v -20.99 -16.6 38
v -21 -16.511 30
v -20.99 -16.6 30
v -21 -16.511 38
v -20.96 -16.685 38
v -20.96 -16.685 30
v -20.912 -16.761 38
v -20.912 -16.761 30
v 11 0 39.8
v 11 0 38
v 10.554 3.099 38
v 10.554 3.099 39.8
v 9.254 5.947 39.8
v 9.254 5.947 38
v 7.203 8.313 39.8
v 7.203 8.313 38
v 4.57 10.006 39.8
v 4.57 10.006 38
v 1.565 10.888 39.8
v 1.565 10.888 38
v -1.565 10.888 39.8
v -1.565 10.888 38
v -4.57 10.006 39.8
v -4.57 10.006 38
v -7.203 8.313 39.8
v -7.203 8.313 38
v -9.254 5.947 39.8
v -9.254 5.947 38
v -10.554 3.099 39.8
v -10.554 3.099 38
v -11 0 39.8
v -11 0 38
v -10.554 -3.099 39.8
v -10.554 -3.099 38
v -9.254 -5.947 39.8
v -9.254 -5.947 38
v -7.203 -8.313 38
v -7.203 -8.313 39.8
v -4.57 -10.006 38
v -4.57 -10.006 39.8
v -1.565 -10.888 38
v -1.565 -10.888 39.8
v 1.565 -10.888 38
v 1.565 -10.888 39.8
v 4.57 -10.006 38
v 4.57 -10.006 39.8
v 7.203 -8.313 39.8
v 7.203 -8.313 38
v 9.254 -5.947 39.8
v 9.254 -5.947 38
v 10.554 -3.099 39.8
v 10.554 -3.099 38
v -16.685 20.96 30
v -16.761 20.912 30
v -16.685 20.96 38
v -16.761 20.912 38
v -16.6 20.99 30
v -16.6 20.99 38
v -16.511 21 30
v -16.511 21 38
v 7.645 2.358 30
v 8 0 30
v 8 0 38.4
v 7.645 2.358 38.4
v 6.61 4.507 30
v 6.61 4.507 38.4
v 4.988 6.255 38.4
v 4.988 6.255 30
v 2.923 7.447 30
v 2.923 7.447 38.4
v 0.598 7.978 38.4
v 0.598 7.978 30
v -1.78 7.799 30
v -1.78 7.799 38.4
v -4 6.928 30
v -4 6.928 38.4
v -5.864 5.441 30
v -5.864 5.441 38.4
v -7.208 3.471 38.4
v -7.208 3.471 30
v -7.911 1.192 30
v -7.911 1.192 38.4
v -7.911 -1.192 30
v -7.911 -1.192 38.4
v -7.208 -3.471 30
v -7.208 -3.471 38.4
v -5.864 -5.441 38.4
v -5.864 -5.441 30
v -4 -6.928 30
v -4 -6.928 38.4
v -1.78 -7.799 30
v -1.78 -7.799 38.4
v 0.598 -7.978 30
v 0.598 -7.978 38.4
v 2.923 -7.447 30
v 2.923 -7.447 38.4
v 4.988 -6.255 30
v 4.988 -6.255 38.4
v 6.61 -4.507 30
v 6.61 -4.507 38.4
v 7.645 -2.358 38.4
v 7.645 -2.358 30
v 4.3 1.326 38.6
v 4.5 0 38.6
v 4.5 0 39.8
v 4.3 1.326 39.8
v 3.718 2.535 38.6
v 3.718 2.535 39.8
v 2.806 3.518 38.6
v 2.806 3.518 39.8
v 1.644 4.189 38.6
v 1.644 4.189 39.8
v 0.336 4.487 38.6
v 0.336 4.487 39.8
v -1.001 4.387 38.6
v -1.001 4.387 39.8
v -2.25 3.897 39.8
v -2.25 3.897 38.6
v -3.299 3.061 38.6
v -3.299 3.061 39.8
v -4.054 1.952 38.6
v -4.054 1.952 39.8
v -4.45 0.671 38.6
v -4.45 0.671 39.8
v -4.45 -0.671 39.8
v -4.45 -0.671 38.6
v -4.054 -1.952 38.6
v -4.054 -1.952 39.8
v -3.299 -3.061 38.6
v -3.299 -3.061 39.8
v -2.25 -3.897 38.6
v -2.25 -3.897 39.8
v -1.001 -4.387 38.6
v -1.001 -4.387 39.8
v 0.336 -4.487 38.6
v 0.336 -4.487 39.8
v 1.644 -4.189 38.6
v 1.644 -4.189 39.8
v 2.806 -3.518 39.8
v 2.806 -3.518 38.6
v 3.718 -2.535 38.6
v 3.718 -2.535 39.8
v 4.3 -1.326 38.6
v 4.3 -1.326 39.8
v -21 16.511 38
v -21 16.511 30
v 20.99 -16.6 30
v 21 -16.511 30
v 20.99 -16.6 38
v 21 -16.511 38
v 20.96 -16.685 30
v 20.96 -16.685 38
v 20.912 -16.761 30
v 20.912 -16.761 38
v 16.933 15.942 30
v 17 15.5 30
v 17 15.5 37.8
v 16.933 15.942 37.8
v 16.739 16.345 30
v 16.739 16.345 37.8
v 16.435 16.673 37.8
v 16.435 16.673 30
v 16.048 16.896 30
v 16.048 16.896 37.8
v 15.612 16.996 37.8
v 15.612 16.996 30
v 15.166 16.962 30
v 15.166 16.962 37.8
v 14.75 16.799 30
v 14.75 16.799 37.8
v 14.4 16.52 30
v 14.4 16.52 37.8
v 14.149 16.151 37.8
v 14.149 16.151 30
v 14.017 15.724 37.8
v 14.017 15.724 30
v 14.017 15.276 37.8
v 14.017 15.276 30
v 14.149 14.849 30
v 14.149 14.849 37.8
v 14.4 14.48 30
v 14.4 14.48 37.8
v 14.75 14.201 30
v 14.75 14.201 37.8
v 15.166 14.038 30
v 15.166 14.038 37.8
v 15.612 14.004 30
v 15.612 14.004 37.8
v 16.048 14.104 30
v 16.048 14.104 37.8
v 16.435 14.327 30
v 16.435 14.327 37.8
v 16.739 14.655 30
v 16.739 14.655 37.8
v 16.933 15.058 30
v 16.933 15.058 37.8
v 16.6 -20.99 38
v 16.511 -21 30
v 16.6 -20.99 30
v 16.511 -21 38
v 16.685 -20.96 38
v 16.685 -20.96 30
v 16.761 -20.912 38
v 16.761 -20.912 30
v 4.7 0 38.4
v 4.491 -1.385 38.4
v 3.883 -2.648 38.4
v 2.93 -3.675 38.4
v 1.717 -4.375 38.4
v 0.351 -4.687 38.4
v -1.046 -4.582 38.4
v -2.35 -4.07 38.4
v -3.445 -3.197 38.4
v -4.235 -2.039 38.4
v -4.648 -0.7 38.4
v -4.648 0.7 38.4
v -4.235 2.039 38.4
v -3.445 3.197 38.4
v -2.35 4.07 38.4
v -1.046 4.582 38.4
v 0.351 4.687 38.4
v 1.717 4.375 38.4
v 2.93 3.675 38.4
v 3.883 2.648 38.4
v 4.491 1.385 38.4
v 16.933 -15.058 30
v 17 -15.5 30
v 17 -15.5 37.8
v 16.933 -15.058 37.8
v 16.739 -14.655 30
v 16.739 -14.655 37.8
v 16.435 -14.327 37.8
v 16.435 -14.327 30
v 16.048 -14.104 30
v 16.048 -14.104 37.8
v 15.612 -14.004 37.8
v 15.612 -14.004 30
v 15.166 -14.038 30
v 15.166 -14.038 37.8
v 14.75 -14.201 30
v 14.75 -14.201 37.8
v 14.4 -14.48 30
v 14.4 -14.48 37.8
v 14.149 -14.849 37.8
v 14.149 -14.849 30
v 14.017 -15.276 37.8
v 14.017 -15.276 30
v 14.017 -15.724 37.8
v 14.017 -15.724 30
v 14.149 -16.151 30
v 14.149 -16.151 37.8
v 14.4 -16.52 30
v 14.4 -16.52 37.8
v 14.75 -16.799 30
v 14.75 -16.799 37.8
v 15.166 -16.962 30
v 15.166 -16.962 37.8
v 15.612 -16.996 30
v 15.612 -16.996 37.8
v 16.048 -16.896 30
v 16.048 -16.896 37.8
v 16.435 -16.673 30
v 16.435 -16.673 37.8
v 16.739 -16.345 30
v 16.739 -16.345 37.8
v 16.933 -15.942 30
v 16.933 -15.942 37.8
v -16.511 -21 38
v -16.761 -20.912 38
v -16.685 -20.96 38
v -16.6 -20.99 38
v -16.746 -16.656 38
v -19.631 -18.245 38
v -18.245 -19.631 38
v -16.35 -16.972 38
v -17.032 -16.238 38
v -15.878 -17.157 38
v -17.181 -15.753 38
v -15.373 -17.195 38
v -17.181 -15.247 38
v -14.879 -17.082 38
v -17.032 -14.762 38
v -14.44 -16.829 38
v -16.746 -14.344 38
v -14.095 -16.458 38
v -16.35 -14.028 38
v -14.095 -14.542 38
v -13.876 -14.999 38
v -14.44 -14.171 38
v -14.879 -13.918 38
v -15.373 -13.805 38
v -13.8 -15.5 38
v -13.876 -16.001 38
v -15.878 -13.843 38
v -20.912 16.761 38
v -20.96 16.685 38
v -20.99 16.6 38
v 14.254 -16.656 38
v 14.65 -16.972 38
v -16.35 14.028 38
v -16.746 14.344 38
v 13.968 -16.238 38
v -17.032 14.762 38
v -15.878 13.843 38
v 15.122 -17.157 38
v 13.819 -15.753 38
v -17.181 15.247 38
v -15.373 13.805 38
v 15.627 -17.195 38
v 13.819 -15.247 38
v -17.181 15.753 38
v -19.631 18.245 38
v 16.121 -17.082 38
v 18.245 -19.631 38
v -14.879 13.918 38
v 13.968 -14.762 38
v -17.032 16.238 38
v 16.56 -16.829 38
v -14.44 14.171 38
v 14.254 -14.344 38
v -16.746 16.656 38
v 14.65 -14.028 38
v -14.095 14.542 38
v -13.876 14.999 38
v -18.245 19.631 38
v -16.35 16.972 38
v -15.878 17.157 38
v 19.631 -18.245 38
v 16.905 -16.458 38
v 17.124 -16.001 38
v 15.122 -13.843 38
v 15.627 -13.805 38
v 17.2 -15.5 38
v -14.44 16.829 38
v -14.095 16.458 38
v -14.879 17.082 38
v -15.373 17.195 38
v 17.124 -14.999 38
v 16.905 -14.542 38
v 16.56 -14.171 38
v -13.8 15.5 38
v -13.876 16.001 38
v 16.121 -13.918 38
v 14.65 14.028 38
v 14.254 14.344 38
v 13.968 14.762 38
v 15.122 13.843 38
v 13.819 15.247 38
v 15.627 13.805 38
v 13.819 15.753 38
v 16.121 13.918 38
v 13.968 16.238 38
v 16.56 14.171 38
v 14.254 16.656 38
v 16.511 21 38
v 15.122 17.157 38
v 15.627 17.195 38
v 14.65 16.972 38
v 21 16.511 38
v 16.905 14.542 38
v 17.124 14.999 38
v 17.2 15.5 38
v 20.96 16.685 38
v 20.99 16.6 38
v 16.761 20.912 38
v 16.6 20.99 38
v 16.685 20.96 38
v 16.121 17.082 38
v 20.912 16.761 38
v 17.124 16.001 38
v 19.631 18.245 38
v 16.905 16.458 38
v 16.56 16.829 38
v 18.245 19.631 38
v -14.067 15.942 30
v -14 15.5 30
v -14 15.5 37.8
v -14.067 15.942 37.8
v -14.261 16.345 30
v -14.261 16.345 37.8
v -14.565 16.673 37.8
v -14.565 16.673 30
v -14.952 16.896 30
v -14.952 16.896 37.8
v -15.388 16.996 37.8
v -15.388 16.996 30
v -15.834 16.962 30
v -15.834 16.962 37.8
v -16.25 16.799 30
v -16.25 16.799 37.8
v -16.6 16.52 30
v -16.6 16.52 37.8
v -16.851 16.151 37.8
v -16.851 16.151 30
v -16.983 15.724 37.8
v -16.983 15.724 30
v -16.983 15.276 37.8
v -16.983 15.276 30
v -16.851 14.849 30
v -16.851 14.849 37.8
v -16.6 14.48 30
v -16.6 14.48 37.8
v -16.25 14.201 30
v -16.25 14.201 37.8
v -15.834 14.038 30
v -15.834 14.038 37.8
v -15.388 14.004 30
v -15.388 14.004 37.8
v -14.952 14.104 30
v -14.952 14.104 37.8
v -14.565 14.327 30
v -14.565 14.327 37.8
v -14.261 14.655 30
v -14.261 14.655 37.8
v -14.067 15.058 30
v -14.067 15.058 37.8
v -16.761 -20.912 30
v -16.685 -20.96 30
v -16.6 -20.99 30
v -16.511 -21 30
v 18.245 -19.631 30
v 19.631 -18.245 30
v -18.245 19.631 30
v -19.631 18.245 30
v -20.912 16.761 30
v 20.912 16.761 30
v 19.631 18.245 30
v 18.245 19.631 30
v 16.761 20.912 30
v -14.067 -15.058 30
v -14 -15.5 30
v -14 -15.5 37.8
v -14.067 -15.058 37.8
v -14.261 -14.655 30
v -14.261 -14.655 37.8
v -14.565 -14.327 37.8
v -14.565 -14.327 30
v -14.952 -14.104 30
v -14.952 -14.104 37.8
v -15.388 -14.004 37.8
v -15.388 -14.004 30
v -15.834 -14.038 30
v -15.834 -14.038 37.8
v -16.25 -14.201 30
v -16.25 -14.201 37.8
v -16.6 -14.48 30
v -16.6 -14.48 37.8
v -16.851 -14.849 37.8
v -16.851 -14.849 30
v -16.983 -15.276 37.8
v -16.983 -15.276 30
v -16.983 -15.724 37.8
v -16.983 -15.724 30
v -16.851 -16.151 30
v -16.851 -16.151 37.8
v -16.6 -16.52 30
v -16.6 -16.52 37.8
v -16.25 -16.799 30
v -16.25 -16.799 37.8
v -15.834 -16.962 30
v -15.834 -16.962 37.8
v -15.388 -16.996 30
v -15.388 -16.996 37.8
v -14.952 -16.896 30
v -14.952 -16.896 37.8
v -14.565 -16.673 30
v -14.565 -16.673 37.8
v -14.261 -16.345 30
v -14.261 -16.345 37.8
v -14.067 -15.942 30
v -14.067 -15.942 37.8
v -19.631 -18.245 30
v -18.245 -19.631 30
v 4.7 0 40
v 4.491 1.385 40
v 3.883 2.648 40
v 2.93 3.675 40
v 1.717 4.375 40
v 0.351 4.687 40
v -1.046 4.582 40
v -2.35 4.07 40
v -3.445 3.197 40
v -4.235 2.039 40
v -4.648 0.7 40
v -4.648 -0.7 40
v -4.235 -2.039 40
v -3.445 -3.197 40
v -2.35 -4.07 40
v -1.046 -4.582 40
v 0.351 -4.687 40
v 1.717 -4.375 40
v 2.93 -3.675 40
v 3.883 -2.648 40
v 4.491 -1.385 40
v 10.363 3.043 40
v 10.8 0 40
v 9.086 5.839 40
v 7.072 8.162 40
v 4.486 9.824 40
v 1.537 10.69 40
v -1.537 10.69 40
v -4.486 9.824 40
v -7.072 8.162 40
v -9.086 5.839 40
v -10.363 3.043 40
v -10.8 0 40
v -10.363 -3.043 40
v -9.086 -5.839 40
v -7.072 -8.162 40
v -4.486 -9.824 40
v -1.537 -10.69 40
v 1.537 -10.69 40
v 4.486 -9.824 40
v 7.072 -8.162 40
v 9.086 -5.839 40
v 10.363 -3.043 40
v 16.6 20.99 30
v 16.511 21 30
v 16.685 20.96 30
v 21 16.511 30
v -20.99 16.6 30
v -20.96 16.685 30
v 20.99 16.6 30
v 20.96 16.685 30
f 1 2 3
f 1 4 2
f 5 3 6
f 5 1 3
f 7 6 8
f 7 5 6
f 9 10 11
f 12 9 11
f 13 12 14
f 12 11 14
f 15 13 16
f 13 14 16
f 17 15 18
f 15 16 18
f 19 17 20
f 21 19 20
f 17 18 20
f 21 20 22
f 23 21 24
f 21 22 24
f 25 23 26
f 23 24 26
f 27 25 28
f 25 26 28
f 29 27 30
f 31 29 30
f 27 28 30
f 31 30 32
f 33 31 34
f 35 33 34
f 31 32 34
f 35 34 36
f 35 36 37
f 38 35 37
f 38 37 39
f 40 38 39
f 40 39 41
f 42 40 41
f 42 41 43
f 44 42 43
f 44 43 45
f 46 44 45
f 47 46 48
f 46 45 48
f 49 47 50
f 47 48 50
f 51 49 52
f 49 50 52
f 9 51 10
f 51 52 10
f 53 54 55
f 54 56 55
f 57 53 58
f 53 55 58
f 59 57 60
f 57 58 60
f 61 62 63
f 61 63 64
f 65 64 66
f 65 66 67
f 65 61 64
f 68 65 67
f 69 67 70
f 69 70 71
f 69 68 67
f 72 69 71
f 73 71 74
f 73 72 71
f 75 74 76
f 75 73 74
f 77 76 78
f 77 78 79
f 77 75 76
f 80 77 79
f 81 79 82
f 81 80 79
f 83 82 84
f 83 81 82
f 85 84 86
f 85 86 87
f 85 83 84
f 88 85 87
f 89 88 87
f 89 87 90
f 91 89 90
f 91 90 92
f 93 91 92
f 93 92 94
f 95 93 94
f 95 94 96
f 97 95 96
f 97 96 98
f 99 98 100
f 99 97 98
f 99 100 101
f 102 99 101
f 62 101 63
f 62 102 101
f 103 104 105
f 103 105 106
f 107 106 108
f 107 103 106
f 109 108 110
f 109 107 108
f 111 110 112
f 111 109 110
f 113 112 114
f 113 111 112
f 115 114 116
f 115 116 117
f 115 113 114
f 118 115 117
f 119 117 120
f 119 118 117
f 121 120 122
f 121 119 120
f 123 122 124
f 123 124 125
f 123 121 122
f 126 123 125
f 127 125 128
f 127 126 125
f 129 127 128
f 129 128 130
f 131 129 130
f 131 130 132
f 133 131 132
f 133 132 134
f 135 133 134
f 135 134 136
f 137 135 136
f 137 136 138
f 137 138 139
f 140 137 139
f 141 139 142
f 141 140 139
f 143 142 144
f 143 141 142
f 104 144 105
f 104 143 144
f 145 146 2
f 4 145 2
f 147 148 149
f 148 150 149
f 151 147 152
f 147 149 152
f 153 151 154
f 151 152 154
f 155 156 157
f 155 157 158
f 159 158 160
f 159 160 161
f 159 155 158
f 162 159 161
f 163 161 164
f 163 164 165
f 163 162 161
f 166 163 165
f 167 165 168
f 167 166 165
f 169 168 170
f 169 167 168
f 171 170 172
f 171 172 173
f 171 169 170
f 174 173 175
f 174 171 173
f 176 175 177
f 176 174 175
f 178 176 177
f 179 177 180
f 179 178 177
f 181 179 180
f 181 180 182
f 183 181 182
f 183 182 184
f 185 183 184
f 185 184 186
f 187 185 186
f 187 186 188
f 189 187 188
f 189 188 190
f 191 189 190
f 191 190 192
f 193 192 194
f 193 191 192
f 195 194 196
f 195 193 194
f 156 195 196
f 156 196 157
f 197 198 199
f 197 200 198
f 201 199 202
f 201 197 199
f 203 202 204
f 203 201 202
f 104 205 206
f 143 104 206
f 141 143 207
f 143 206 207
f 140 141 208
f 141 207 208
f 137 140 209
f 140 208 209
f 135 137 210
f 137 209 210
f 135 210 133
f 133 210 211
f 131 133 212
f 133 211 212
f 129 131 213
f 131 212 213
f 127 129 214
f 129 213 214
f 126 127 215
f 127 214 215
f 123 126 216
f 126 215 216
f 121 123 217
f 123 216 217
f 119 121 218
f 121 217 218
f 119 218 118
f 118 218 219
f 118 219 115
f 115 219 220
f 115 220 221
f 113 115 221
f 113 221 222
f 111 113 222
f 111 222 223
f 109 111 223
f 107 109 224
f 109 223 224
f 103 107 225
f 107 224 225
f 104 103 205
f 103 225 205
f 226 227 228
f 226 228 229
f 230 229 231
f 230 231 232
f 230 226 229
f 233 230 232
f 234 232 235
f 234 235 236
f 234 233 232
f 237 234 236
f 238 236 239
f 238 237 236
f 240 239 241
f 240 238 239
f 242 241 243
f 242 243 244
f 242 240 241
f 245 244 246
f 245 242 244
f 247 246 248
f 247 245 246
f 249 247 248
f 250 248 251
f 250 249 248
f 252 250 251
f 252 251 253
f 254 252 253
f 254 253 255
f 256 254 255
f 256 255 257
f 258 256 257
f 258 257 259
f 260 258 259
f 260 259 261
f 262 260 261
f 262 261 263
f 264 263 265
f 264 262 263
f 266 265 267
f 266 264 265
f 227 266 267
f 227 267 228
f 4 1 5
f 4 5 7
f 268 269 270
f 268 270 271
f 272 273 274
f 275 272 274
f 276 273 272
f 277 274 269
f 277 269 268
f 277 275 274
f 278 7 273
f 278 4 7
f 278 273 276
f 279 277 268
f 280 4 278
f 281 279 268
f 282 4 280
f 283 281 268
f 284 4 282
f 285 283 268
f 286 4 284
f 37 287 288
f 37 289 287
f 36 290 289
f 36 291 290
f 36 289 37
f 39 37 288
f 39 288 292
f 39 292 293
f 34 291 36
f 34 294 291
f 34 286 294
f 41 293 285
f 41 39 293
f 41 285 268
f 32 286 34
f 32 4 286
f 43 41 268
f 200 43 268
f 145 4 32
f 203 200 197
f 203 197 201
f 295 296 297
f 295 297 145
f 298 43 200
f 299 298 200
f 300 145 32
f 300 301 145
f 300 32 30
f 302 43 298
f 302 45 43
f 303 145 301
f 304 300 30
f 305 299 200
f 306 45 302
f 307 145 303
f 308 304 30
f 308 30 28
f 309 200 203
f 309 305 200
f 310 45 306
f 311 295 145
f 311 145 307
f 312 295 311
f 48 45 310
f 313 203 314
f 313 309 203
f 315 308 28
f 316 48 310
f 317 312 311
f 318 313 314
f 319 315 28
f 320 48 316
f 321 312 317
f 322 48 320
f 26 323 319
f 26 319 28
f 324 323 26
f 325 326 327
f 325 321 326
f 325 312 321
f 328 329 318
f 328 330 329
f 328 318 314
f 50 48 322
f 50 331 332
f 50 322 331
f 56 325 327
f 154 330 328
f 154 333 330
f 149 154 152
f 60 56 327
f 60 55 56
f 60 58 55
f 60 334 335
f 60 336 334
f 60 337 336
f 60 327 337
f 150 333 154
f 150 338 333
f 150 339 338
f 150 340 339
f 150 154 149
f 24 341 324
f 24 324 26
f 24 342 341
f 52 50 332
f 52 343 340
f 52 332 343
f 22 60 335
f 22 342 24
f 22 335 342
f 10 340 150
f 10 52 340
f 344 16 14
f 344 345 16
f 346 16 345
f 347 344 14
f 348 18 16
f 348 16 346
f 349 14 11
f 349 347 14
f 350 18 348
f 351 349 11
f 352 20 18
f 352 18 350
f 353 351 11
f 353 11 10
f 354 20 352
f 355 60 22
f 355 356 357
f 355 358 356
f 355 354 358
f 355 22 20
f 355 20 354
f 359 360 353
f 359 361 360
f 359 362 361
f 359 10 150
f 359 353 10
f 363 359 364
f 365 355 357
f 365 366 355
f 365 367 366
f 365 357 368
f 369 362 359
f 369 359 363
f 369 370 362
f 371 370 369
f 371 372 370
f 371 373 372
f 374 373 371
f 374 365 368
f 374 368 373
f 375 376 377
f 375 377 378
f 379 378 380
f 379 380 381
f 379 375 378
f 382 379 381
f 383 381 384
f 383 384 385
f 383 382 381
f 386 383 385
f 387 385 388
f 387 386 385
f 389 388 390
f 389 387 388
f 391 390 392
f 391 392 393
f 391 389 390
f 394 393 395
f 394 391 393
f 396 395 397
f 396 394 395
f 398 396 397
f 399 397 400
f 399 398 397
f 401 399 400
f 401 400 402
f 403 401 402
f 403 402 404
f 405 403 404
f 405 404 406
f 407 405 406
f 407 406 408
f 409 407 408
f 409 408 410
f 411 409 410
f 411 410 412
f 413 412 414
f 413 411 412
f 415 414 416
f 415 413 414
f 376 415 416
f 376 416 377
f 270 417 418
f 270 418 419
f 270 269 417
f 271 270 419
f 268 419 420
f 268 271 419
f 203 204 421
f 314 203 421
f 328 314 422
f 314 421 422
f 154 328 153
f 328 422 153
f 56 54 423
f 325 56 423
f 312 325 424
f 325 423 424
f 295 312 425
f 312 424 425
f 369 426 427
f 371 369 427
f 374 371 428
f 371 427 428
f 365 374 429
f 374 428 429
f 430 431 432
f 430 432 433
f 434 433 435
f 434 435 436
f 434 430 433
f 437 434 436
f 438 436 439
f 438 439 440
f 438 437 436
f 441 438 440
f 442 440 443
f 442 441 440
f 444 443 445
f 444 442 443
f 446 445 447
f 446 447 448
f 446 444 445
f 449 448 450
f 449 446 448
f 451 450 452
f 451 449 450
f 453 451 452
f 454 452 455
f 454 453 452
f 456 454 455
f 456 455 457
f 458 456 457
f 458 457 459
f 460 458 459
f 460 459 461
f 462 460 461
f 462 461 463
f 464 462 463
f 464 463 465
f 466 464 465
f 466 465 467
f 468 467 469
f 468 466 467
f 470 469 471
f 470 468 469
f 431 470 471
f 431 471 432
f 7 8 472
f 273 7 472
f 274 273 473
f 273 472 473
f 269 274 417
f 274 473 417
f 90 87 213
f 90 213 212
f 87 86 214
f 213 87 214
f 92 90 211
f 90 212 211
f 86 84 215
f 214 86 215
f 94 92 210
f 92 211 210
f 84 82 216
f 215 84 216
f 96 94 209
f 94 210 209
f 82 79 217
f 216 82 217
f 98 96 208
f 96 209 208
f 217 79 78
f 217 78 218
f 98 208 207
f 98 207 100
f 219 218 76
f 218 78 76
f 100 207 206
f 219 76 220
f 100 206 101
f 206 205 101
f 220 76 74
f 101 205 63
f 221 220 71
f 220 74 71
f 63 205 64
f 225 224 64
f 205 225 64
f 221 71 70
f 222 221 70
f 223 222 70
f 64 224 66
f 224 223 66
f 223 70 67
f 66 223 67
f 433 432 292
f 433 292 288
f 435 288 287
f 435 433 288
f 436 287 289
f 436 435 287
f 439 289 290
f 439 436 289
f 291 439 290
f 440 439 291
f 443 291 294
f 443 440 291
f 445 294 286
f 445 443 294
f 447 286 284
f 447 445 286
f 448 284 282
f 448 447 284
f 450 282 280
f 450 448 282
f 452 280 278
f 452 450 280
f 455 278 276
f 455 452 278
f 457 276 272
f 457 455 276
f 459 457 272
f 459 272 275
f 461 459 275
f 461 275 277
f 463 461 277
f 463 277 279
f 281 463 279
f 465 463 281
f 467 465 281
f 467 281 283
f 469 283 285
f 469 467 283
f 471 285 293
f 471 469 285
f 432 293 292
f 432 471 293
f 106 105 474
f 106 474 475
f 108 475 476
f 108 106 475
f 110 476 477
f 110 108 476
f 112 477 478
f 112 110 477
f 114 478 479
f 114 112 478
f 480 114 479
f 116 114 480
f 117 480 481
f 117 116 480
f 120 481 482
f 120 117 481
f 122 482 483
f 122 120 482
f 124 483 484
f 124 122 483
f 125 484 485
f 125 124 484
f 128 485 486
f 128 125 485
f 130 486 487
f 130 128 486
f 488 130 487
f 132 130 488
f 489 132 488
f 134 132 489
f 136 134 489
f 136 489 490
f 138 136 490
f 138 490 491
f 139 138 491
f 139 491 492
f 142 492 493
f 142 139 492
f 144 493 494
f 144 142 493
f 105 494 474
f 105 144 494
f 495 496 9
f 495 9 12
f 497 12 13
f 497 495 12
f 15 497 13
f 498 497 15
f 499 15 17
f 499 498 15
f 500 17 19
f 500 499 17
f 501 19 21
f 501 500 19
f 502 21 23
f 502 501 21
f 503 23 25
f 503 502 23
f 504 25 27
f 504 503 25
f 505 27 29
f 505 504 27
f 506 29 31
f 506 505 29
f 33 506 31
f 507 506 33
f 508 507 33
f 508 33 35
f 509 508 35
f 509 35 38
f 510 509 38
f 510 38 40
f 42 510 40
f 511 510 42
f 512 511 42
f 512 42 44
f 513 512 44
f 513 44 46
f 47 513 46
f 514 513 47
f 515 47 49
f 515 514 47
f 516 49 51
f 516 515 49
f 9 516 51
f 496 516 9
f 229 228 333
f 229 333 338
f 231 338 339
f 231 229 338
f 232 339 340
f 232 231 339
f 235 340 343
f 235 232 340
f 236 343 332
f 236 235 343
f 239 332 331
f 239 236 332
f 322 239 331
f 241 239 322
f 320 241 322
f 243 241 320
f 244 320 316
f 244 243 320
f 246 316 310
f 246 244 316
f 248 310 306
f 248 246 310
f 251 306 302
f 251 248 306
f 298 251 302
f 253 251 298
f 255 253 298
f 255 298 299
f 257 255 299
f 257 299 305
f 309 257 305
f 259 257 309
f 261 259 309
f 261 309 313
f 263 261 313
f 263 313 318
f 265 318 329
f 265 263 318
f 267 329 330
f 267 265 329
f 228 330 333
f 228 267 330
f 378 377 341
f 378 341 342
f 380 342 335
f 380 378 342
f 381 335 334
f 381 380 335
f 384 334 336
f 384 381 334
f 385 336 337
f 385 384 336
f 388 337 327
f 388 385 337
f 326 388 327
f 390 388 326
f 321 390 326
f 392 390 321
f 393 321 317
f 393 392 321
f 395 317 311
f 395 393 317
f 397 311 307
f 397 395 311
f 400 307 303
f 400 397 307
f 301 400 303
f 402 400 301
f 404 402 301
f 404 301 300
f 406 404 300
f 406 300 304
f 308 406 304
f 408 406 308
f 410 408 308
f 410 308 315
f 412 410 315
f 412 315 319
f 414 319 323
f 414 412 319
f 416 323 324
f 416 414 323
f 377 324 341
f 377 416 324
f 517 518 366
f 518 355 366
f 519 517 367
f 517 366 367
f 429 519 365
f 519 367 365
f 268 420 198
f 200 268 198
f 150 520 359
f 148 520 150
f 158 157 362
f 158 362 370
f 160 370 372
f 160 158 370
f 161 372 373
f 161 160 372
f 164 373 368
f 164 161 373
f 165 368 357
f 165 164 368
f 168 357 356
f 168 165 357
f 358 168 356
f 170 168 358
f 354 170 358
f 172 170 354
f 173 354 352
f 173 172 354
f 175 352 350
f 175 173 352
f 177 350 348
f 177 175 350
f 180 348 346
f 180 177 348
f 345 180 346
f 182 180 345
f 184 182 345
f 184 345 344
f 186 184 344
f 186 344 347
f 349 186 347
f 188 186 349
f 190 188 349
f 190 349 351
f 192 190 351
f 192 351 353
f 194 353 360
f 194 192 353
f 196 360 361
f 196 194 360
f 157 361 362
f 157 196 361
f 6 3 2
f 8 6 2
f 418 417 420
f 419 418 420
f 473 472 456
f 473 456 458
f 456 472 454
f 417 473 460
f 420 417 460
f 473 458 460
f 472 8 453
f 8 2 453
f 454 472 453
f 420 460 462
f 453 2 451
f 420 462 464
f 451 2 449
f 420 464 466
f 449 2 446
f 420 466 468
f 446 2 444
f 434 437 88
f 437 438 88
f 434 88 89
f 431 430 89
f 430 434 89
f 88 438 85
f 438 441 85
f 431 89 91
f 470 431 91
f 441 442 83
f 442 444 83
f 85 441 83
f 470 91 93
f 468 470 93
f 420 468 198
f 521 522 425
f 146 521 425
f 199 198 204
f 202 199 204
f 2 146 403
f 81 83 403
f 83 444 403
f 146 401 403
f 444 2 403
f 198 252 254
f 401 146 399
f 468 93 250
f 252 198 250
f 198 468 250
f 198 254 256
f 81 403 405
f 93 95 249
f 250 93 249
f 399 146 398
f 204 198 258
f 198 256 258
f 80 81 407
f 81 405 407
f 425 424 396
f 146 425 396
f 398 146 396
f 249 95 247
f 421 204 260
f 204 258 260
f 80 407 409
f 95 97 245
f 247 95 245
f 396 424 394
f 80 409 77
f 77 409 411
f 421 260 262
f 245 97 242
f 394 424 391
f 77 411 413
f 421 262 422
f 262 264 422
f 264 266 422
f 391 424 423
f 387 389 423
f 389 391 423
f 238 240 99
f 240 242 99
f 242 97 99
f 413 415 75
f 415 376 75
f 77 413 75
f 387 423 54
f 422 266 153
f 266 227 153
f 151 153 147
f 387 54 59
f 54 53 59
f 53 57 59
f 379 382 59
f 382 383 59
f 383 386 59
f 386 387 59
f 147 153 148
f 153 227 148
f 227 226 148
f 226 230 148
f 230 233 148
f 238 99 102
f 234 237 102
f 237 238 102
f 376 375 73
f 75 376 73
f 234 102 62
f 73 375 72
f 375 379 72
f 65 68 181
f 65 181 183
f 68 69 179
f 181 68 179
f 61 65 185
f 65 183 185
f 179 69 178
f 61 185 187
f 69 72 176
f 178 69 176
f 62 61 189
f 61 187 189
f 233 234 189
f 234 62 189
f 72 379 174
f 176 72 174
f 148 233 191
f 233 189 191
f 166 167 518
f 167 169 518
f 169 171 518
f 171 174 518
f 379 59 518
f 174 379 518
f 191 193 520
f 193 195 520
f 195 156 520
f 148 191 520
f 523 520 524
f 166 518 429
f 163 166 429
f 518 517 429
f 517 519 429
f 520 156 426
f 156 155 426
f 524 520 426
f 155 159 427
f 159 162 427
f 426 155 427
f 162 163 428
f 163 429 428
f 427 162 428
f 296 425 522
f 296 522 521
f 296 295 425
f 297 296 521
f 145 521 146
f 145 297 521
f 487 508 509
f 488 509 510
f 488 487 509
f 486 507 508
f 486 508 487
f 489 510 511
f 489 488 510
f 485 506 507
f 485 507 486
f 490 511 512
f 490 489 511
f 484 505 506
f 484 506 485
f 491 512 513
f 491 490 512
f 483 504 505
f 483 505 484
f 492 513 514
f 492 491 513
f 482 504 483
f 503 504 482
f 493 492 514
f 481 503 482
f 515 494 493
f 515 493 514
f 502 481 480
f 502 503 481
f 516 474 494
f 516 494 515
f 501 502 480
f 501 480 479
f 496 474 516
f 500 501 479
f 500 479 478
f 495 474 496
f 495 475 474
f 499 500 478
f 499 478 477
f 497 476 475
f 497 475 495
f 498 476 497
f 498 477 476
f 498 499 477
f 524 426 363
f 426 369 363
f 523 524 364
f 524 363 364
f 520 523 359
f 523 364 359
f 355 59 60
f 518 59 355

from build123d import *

# Parameters (mm, degrees)
SKETCH015_R     = 4.5
SKETCH015_R_2   = 1.5
PAD008_DEPTH    = 8
SKETCH016_R     = 11
SKETCH016_R_2   = 4.5
PAD009_DEPTH    = 2
SKETCH017_R     = 8
POCKET004_DEPTH = 8.4
CHAMFER003_SIZE = 0.2
FILLET002_R     = 0.4


with BuildPart() as part:
    # Sketch015 → Pad008 (new body)
    with BuildSketch(Plane.XY):
        with BuildLine():
            ThreePointArc((-16.650526, 21), (-18.950462, 18.950462), (-21, 16.650526))
            Line((-21, 16.650526), (-21, -16.650526))
            ThreePointArc((-21, -16.650526), (-18.950462, -18.950462), (-16.650526, -21))
            Line((-16.650526, -21), (16.650526, -21))
            ThreePointArc((16.650526, -21), (18.950462, -18.950462), (21, -16.650526))
            Line((21, 16.650526), (21, -16.650526))
            ThreePointArc((21, 16.650526), (18.950462, 18.950462), (16.650526, 21))
            Line((-16.650526, 21), (16.650526, 21))
        make_face()
        Circle(SKETCH015_R, mode=Mode.SUBTRACT)
        with Locations((-15.5, 15.5)):
            Circle(SKETCH015_R_2, mode=Mode.SUBTRACT)
        with Locations((15.5, 15.5)):
            Circle(SKETCH015_R_2, mode=Mode.SUBTRACT)
        with Locations((15.5, -15.5)):
            Circle(SKETCH015_R_2, mode=Mode.SUBTRACT)
        with Locations((-15.5, -15.5)):
            Circle(SKETCH015_R_2, mode=Mode.SUBTRACT)
    extrude(amount=PAD008_DEPTH)

    # Sketch016 (on Face15 of Pad008) → Pad009 (join)
    with BuildSketch(Plane.XY.offset(8)):
        Circle(SKETCH016_R)
        Circle(SKETCH016_R_2, mode=Mode.SUBTRACT)
    extrude(amount=PAD009_DEPTH)

    # Sketch017 → Pocket004 (cut)
    with BuildSketch(Plane.XY):
        Circle(SKETCH017_R)
    extrude(amount=POCKET004_DEPTH, mode=Mode.SUBTRACT)

    # Chamfer003
    chamfer003_edges = [part.edges().sort_by_distance(p)[0] for p in [
        (-11, 0, 10),
        (14, 15.5, 8),
        (-17, 15.5, 8),
        (-17, -15.5, 8),
        (14, -15.5, 8),
        (-4.5, 0, 10),
        (-4.5, 0, 8.4),
    ]]
    chamfer(chamfer003_edges, length=CHAMFER003_SIZE)

    # Fillet002
    fillet002_edges = [part.edges().sort_by_distance(p)[0] for p in [
        (16.650526, 21, 4),
        (21, 16.650526, 4),
        (21, -16.650526, 4),
        (16.650526, -21, 4),
        (-21, -16.650526, 4),
        (-16.650526, -21, 4),
        (-21, 16.650526, 4),
        (-16.650526, 21, 4),
    ]]
    fillet(fillet002_edges, radius=FILLET002_R)


with BuildPart() as part_1:
    # Body005 placement: moved
    add(part.part.moved(Location((0, 0, 30))))


solid = part_1.part
